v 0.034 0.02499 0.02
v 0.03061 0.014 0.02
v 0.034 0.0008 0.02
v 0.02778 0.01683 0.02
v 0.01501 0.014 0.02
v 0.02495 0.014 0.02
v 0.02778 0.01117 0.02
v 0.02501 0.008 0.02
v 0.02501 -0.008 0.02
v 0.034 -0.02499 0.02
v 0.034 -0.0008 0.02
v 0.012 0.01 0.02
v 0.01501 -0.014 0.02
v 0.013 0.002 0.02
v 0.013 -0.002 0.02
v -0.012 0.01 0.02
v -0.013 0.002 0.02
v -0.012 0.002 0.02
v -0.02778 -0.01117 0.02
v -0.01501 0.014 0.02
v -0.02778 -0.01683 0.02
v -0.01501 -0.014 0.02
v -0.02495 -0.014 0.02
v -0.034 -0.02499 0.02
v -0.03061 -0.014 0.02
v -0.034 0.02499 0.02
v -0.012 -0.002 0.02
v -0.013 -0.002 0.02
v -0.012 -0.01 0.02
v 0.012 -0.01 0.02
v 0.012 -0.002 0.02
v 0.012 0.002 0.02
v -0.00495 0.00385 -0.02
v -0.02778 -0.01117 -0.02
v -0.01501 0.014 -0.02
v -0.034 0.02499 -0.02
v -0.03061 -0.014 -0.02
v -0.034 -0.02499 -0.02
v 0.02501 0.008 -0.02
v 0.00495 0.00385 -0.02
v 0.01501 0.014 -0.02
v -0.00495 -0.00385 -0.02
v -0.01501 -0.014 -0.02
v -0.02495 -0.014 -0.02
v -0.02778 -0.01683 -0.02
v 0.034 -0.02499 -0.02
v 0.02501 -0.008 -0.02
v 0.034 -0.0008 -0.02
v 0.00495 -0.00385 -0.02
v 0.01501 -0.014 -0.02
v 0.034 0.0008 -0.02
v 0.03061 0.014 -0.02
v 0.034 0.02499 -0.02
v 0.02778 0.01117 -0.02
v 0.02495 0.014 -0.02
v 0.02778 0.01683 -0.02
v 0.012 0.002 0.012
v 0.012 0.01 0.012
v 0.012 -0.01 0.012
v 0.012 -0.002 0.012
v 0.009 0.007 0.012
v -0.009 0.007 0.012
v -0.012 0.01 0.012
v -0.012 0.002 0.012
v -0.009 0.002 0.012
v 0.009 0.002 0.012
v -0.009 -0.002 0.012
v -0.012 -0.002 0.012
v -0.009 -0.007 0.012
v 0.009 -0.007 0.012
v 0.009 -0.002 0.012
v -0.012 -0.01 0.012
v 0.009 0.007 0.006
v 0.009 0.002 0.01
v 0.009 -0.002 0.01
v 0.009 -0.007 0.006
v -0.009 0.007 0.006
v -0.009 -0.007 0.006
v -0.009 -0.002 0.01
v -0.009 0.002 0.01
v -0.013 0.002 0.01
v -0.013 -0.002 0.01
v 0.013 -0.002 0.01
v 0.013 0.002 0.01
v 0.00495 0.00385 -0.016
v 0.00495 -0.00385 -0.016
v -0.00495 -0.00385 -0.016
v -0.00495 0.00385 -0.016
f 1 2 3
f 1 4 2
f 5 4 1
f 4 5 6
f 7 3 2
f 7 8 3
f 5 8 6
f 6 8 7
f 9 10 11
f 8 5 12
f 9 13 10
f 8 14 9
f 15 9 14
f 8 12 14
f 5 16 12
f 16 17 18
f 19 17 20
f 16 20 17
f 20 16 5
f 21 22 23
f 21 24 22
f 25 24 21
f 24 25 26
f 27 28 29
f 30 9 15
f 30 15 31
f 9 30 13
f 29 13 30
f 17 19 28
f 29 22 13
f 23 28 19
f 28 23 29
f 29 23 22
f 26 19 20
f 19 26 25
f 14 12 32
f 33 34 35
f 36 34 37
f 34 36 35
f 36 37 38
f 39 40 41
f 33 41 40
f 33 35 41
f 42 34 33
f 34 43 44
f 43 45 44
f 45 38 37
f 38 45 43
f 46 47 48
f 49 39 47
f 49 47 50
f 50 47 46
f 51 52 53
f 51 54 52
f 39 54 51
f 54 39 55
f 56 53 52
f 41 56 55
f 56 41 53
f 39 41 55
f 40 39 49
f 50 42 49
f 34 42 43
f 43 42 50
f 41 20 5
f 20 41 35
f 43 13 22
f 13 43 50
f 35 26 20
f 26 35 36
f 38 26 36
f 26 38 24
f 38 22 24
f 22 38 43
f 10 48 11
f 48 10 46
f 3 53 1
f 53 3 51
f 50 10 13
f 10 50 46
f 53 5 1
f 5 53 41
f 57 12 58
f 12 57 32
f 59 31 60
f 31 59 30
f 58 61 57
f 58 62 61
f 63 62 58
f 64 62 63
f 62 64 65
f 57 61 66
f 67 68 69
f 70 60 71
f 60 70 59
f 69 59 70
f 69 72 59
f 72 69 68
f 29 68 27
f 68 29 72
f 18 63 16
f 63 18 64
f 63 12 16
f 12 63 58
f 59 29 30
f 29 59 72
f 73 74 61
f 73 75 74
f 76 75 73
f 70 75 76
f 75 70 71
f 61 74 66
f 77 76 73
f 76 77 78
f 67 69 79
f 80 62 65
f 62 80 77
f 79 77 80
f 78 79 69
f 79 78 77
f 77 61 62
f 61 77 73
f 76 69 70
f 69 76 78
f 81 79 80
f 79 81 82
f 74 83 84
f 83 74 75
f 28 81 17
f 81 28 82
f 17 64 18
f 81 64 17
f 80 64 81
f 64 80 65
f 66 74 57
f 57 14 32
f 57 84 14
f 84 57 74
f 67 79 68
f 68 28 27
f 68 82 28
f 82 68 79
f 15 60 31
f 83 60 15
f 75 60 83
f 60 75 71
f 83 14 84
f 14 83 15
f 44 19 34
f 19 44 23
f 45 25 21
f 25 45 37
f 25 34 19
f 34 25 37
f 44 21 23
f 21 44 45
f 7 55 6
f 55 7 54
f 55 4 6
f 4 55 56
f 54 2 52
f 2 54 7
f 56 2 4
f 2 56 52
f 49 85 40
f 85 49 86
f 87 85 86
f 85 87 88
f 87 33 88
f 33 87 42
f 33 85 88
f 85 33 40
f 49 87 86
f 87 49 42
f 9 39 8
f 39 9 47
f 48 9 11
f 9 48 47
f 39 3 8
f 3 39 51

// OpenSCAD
// Compact symmetric bracket-like block with wedge wings, stepped pockets/slots,
// diamond through-holes on wings, and a V-notch along one edge.
// Scaled small but non-zero so geometry renders robustly.

$fn = 48;

// -------------------- Parameters --------------------
bb_x = 0.07;
bb_y = 0.05;
bb_z = 0.04;

body_x = 0.032;
body_y = 0.028;
body_z = bb_z;

wing_span_x_each = (bb_x - body_x)/2;          // overall X matches bb_x
wing_flare_y_at_body = body_y;
wing_flare_y_at_tip  = bb_y;
wing_z = bb_z;

step1_depth_z = 0.008;
step1_x = 0.024;
step1_y = 0.020;

step2_depth_z = 0.006;
step2_x = 0.018;
step2_y = 0.014;

slot_w = 0.004;
slot_l = 0.014;
slot_depth_z = 0.010;
slot_spacing_x = 0.006;

v_notch_depth_x = 0.010;
v_notch_opening_y = 0.016;

diamond_hole_flat = 0.004;
diamond_hole_angle_deg = 45;
diamond_hole_offset_x_from_center = body_x/2 + wing_span_x_each*0.62; // on wing region
diamond_hole_offset_y = bb_y*0.28;

pocket_depth_z = 0.004;

eps = 0.001;                 // increased for robust booleans at tiny scale
cut_through = bb_z + 4*eps;

// -------------------- Helpers --------------------
module wing_wedge(sign=1) {
    // Build wedge in +X, then mirror for left side to avoid self-crossing polygons.
    // Attached to body with slight overlap.
    if (sign < 0) {
        mirror([1,0,0]) wing_wedge(1);
    } else {
        translate([body_x/2 - eps, 0, 0])
            linear_extrude(height=wing_z, center=true)
                polygon(points=[
                    [0, -wing_flare_y_at_body/2],
                    [wing_span_x_each, -wing_flare_y_at_tip/2],
                    [wing_span_x_each,  wing_flare_y_at_tip/2],
                    [0,  wing_flare_y_at_body/2]
                ]);
    }
}

module base_solid() {
    union() {
        cube([body_x, body_y, body_z], center=true);
        wing_wedge(-1);
        wing_wedge(+1);
    }
}

// Stepped recesses on the TOP face (subtract)
module top_step_recesses() {
    translate([0, 0, body_z/2 - step1_depth_z/2 + eps])
        cube([step1_x, step1_y, step1_depth_z + 2*eps], center=true);

    translate([0, 0, body_z/2 - step1_depth_z - step2_depth_z/2 + eps])
        cube([step2_x, step2_y, step2_depth_z + 2*eps], center=true);
}

// Three rectangular slots/pockets on the TOP face (subtract)
module top_slots() {
    for (sx = [-slot_spacing_x, 0, slot_spacing_x]) {
        translate([sx, 0, body_z/2 - slot_depth_z/2 + eps])
            cube([slot_l, slot_w, slot_depth_z + 2*eps], center=true);
    }
}

// Additional small bottom pocket (subtract)
module bottom_pocket() {
    translate([0, 0, -body_z/2 + pocket_depth_z/2 - eps])
        cube([step2_x*0.55, step2_y*0.55, pocket_depth_z + 2*eps], center=true);
}

// V-notch along the +X outer edge (subtract), visible in top/bottom views
module v_notch() {
    // Use a centered 2D triangle and place it so its left edge sits on +X outer face.
    translate([bb_x/2 - v_notch_depth_x/2, 0, 0])
        linear_extrude(height=cut_through, center=true)
            polygon(points=[
                [-v_notch_depth_x/2, -v_notch_opening_y/2],
                [ v_notch_depth_x/2,  0],
                [-v_notch_depth_x/2,  v_notch_opening_y/2]
            ]);
}

// Diamond/square through-holes on wing regions (subtract)
module diamond_holes() {
    for (sx = [-1, 1]) {
        translate([sx*diamond_hole_offset_x_from_center, sx*diamond_hole_offset_y, 0])
            rotate([0, 0, diamond_hole_angle_deg])
                cube([diamond_hole_flat, diamond_hole_flat, cut_through], center=true);
    }
}

// -------------------- Final Model --------------------
difference() {
    base_solid();

    top_step_recesses();
    top_slots();
    bottom_pocket();
    v_notch();
    diamond_holes();
}
